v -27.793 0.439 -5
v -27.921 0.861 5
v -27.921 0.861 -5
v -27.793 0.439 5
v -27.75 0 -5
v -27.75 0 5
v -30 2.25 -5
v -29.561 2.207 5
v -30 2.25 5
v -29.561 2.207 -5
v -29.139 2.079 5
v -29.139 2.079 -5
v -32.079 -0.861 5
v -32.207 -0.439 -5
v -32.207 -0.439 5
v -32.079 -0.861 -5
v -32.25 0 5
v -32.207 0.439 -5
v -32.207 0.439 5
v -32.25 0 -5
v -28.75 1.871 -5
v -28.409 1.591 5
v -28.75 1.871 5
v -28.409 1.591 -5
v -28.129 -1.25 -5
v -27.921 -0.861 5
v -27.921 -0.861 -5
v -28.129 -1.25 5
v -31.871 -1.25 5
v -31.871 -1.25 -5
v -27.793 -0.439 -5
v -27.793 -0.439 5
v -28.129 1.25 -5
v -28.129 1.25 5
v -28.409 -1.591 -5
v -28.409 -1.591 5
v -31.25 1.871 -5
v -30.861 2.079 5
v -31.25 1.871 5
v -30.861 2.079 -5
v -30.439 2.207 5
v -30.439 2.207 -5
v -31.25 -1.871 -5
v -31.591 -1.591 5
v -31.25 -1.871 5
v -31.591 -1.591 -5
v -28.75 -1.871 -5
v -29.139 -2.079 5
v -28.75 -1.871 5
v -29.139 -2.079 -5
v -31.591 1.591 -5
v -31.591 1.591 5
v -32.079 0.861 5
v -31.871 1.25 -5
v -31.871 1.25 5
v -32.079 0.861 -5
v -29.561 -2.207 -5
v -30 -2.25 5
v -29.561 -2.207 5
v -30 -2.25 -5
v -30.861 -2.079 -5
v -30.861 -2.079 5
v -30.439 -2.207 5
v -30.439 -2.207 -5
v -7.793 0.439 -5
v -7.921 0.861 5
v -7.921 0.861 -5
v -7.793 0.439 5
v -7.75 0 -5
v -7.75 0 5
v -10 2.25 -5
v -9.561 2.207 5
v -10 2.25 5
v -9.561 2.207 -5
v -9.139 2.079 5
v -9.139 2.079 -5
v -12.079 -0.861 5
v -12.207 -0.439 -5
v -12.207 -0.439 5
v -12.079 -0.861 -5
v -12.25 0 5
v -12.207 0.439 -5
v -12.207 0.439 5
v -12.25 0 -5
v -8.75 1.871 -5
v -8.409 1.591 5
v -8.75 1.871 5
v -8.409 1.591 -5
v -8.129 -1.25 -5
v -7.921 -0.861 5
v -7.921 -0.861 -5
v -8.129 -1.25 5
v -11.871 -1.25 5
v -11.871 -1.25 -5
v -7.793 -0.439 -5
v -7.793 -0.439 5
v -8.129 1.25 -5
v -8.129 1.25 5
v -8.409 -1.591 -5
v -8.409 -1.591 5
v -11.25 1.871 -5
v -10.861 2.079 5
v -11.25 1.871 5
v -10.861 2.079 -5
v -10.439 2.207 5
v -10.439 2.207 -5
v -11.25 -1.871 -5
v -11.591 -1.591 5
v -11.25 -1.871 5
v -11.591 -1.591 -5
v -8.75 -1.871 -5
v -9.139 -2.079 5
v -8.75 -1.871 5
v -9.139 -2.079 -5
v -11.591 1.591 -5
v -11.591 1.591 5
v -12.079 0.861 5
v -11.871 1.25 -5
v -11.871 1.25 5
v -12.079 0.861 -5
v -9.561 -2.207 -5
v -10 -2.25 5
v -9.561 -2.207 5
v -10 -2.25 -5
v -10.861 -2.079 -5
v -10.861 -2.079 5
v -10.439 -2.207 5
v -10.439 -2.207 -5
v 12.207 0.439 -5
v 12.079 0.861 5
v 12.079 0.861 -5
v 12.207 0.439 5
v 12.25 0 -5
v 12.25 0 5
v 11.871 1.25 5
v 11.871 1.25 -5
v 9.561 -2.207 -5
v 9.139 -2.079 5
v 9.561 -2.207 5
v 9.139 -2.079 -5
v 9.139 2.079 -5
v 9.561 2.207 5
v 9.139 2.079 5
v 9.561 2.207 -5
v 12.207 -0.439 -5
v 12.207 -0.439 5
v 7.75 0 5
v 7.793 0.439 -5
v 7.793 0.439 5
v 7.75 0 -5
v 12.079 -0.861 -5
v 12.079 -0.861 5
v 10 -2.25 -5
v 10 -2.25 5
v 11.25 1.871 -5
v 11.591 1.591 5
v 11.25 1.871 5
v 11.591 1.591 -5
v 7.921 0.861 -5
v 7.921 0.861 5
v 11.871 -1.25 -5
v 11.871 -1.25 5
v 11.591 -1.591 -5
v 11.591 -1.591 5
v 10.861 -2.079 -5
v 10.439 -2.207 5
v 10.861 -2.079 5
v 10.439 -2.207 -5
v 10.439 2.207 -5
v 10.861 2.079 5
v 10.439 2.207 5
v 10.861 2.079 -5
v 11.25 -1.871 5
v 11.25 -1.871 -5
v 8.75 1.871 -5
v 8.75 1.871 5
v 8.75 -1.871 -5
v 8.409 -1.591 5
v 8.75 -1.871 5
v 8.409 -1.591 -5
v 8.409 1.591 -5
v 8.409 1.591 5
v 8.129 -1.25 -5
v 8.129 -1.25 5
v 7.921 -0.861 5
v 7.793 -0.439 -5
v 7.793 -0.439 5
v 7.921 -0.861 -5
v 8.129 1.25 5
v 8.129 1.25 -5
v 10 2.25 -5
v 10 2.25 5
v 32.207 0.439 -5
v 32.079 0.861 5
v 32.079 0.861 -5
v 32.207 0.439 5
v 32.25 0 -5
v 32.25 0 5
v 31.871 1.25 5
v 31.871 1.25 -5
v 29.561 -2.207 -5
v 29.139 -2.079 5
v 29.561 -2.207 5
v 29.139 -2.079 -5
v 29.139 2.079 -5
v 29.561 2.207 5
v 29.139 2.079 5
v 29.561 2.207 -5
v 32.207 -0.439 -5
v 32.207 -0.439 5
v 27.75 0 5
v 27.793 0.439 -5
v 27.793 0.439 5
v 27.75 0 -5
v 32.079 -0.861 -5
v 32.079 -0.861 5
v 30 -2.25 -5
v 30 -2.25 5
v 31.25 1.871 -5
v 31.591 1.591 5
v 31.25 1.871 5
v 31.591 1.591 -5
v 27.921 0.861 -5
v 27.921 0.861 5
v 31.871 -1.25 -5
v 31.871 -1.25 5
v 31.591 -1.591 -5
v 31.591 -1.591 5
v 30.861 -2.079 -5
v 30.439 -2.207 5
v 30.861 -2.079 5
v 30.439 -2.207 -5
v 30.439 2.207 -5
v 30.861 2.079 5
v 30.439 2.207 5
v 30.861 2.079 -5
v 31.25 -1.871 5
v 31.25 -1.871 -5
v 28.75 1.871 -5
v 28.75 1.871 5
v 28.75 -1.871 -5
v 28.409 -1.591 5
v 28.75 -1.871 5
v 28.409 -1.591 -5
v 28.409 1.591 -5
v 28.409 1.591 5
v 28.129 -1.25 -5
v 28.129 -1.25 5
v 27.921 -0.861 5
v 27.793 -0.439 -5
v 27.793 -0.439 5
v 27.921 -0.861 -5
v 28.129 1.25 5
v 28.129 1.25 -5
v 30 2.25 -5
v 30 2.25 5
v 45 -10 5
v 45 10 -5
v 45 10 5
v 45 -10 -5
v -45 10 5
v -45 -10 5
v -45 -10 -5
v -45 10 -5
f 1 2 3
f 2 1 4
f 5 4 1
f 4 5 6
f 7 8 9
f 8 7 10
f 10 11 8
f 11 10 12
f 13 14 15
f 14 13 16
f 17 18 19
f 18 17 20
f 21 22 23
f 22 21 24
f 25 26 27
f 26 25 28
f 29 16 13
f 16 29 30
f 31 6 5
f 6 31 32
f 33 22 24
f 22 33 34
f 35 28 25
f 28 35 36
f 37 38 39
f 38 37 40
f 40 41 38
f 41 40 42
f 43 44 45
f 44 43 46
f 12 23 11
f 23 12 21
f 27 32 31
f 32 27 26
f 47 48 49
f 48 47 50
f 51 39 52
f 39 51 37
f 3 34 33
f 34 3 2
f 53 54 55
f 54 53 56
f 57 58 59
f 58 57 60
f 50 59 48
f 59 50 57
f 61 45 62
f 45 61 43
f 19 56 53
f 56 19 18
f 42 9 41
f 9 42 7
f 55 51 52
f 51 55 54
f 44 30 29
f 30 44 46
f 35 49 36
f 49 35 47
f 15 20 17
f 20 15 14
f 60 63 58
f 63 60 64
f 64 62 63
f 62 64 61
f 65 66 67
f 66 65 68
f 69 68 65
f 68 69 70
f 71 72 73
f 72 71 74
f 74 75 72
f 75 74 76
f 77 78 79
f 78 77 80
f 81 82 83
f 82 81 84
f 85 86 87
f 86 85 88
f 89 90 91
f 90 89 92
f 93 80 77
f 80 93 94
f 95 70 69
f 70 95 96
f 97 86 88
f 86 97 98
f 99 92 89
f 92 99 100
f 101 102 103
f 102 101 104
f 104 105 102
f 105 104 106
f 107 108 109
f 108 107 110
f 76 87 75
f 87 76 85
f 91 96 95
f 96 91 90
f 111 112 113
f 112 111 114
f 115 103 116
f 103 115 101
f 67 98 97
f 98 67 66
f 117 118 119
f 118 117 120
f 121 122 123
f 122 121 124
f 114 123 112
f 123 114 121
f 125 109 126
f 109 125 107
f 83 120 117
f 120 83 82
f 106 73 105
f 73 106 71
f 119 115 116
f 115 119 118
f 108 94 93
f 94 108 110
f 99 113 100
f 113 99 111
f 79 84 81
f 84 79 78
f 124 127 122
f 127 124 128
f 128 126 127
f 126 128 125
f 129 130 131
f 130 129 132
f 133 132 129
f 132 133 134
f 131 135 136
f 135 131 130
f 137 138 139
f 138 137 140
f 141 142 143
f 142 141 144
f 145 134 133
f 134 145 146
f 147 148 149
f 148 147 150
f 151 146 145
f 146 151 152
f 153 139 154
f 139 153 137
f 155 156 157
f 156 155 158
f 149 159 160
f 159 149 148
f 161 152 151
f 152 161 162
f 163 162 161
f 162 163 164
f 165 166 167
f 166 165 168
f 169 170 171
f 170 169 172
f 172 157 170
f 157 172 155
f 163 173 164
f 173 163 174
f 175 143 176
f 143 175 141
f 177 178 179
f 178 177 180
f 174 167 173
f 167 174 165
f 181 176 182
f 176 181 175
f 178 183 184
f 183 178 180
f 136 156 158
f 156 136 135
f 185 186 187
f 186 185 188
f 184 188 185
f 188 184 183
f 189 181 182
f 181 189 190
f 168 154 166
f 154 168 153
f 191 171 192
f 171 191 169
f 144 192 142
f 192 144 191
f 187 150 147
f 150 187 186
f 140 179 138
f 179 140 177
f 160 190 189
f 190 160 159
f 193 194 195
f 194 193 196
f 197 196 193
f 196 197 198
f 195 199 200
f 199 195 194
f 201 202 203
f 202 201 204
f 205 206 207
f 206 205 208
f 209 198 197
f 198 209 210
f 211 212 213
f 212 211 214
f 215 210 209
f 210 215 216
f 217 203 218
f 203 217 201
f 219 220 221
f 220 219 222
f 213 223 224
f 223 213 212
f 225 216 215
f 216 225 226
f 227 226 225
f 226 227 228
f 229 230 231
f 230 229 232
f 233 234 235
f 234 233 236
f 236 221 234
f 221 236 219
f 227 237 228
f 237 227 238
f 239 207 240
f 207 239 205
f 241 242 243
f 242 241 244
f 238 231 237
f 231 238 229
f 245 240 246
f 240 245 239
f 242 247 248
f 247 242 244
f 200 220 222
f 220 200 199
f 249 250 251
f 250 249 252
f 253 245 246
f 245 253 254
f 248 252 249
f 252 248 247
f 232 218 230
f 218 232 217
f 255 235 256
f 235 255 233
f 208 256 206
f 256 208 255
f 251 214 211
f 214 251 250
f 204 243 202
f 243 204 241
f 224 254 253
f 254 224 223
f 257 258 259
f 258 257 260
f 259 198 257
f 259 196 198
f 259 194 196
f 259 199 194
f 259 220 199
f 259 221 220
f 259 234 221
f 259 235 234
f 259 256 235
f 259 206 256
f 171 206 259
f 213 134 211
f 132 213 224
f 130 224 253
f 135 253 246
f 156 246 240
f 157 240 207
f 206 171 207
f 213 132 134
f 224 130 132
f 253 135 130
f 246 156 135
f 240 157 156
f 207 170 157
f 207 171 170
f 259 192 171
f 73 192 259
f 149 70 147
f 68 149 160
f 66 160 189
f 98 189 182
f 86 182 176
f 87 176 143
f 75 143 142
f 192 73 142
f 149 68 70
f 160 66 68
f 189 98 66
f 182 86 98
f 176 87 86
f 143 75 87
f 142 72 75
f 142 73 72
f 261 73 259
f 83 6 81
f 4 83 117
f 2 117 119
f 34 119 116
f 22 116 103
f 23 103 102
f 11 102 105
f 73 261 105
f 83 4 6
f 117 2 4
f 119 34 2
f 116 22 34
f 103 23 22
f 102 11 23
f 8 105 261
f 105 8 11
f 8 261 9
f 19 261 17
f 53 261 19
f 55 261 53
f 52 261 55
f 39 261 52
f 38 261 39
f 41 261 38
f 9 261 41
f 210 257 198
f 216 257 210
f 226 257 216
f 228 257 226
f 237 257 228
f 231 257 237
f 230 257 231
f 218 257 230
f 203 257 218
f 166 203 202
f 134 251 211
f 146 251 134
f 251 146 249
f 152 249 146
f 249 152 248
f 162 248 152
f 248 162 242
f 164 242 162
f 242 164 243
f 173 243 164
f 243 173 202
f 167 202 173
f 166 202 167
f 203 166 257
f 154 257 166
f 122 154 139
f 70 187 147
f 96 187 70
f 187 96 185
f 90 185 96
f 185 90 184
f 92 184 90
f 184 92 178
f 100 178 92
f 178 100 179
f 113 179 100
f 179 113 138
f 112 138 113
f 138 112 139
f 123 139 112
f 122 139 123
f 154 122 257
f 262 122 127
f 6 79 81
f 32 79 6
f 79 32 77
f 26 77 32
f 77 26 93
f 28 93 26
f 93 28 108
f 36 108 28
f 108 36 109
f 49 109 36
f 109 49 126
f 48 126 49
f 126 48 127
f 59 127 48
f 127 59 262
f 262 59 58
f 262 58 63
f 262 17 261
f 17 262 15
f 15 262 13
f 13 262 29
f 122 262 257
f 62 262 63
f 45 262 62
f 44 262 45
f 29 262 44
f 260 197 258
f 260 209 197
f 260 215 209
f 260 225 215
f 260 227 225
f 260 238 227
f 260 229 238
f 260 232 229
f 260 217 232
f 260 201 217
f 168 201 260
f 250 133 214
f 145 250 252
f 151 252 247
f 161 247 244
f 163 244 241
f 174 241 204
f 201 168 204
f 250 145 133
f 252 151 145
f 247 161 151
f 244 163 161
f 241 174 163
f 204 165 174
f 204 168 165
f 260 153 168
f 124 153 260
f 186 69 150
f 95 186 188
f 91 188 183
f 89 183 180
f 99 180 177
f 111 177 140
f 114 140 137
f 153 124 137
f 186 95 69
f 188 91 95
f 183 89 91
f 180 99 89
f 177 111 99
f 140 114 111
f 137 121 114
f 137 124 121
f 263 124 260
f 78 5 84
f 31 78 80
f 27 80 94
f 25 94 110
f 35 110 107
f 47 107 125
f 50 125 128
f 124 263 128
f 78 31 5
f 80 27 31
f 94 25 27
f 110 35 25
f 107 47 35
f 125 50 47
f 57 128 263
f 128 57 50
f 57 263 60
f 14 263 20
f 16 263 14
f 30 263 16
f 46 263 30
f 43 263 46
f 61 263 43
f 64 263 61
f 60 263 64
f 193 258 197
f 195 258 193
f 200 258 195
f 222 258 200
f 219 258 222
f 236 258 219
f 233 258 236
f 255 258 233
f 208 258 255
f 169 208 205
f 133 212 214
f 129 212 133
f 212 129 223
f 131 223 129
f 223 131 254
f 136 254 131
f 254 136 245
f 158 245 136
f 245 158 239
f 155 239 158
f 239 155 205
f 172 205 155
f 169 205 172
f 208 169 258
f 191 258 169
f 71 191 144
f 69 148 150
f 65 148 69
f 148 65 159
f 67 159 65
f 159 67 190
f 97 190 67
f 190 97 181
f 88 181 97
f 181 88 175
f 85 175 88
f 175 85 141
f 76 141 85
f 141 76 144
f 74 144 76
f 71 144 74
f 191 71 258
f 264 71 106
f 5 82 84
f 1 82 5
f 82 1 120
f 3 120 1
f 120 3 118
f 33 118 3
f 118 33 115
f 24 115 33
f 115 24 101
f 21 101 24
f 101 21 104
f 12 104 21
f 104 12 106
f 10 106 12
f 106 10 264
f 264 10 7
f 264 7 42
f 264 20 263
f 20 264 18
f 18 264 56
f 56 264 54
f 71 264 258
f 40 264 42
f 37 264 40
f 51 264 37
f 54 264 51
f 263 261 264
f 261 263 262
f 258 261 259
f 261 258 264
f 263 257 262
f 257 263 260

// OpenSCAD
$fn = 32;

// ----------------------------------------------------------------------
// Hole bar, 4 x Ø4.5
// skip layout, 15 mm edge offset
// ----------------------------------------------------------------------

// --- parameters (mm) ---
bar_w = 20;       // bar width (Y)
bar_t = 10;       // bar thickness (Z)
holes = 4;        // holes per row
hole_d = 4.5;     // hole diameter
edge = 15;        // offset from the bar end to the first hole
grid_pitch = 10;  // grid the bar was laid out on

// --- derived feature positions (mm) ---
pitch = grid_pitch * 2;       // = 20   holes sit every other grid slot
span = (holes - 1) * pitch;   // = 60   distance between the end holes
bar_l = span + 2 * edge;      // = 90   overall bar length
start_x = -bar_l / 2 + edge;  // = -30   X of the first hole
feature_centers = [
  [start_x + 0 * pitch, 0],
  [start_x + 1 * pitch, 0],
  [start_x + 2 * pitch, 0],
  [start_x + 3 * pitch, 0]
];   // hole centres of the first row

// bar with one row of holes, drilled from feature_centers
difference() {
  translate([-bar_l / 2, -bar_w / 2, -bar_t / 2]) cube([bar_l, bar_w, bar_t]);
  for (centre = feature_centers)
    translate([centre[0], centre[1], 0])
      cylinder(d = hole_d, h = bar_t + 2, center = true);
}
